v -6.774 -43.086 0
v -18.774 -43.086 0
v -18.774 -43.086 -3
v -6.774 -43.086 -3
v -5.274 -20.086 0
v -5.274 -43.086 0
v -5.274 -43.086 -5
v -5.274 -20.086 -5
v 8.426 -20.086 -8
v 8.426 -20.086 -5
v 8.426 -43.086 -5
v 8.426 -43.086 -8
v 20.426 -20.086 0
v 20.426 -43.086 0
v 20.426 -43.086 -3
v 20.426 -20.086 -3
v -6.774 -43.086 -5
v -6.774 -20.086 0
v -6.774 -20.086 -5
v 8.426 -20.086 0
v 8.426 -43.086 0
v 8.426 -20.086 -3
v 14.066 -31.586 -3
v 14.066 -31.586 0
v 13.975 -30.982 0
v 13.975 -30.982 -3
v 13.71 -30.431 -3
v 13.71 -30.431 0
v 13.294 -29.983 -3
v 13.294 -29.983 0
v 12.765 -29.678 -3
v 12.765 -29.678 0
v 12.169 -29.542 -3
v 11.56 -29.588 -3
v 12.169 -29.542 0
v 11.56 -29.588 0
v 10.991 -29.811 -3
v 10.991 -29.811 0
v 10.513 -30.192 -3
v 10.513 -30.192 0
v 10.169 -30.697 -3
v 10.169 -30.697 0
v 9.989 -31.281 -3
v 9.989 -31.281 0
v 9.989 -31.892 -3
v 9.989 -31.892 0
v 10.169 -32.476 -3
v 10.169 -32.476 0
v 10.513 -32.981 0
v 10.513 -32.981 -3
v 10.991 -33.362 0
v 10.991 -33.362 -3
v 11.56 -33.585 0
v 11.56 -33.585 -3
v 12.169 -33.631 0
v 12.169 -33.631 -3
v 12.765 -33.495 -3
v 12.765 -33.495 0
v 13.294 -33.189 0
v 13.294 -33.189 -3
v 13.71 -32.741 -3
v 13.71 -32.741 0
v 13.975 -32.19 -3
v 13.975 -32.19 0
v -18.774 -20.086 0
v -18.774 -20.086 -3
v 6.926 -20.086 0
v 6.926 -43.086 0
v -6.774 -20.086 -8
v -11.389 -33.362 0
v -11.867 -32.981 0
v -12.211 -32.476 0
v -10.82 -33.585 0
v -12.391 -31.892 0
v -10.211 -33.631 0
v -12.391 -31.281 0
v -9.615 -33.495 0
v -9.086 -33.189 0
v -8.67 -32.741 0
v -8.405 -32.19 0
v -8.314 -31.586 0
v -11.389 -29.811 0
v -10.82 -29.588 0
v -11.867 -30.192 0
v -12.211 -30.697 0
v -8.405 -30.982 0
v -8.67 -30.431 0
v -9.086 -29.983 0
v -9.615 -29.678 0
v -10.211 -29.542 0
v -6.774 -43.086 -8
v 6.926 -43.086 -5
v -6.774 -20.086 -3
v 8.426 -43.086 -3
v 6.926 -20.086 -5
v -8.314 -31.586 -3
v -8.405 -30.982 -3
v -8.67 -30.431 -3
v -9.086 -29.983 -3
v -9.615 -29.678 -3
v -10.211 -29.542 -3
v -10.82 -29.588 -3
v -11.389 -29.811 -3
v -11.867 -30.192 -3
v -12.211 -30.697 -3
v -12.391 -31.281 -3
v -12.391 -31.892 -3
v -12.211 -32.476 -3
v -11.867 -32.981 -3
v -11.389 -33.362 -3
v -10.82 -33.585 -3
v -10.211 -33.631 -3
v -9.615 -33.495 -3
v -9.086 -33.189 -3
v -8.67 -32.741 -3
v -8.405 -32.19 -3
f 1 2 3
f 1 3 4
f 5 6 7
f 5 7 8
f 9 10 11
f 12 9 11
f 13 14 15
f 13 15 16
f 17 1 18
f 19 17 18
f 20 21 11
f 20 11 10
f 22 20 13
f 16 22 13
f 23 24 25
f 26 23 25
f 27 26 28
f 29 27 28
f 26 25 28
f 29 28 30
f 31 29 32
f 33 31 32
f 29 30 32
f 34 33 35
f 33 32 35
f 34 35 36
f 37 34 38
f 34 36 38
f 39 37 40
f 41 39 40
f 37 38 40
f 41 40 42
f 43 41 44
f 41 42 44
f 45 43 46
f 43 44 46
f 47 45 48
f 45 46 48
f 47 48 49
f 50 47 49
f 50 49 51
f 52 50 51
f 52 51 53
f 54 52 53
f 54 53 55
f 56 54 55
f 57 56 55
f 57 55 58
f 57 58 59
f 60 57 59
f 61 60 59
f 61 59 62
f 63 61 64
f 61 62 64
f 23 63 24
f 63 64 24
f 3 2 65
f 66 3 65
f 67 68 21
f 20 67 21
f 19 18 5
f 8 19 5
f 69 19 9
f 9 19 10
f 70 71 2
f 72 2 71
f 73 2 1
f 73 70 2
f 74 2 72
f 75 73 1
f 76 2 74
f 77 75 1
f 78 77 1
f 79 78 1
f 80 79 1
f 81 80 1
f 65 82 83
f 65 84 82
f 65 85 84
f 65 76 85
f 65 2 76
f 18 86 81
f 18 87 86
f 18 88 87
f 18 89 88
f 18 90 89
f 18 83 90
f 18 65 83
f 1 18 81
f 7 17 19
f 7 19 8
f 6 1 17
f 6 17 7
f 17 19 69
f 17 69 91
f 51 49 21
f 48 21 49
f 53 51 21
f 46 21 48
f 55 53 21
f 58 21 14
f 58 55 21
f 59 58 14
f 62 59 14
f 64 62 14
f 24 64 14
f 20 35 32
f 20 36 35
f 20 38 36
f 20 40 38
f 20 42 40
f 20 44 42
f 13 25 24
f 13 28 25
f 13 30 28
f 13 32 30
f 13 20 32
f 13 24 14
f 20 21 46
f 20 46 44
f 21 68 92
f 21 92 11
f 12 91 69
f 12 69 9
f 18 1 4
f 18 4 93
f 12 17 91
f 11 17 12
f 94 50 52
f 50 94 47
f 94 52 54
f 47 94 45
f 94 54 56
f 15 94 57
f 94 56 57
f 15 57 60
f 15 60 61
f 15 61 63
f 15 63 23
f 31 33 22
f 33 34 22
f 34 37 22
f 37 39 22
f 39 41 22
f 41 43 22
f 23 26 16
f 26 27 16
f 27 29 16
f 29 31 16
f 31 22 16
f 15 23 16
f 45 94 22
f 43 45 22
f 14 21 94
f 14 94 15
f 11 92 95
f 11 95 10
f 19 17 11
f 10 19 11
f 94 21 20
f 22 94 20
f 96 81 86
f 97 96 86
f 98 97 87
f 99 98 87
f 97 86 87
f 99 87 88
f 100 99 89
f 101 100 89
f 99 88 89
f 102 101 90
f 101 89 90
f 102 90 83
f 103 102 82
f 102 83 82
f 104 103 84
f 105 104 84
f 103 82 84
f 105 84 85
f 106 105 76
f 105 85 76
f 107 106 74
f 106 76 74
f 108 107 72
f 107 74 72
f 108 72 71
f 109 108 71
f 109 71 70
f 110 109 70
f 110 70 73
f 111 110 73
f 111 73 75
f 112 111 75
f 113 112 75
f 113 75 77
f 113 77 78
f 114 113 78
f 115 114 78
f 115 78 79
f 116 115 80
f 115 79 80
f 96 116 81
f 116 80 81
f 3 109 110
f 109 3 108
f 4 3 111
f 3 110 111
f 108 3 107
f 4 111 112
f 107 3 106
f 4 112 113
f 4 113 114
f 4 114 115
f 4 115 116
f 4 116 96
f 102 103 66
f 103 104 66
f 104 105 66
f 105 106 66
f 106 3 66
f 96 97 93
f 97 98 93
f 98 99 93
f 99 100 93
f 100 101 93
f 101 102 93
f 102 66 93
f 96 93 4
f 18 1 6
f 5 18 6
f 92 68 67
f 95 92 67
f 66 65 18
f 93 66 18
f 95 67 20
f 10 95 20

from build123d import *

# Parameters (mm, degrees)
F0_W     = 1.5
F0_H     = 23
F1_DEPTH = 5
F0_W_2   = 12
F0_R     = 2.05
F2_DEPTH = 3
F3_W     = 15.2
F3_H     = 23
F4_DEPTH = 3


with BuildPart() as f1:
    # F0 (on Top) → F1 (new body)
    with BuildSketch(Plane.XY):
        with Locations((-6.023751, -31.586234)):
            Rectangle(F0_W, F0_H)
        with Locations((7.676249, -31.586234)):
            Rectangle(F0_W, F0_H)
    extrude(amount=-F1_DEPTH)


with BuildPart() as f2:
    # F0 (on Top) → F2 (new body)
    with BuildSketch(Plane.XY):
        with Locations((-12.773751, -31.586234)):
            Rectangle(F0_W_2, F0_H)
        with Locations((-10.363751, -31.586234)):
            Circle(F0_R, mode=Mode.SUBTRACT)
        with Locations((14.426249, -31.586234)):
            Rectangle(F0_W_2, F0_H)
        with Locations((12.016249, -31.586234)):
            Circle(F0_R, mode=Mode.SUBTRACT)
    extrude(amount=-F2_DEPTH)


with BuildPart() as f4:
    # F3 (on face) → F4 (new body)
    with BuildSketch(Plane(origin=(0, 0, -5), x_dir=(1, 0, 0), z_dir=(0, 0, -1))):
        with Locations((0.826249, 31.586234)):
            Rectangle(F3_W, F3_H)
    extrude(amount=F4_DEPTH)


solid = Compound([f1.part, f2.part, f4.part])
